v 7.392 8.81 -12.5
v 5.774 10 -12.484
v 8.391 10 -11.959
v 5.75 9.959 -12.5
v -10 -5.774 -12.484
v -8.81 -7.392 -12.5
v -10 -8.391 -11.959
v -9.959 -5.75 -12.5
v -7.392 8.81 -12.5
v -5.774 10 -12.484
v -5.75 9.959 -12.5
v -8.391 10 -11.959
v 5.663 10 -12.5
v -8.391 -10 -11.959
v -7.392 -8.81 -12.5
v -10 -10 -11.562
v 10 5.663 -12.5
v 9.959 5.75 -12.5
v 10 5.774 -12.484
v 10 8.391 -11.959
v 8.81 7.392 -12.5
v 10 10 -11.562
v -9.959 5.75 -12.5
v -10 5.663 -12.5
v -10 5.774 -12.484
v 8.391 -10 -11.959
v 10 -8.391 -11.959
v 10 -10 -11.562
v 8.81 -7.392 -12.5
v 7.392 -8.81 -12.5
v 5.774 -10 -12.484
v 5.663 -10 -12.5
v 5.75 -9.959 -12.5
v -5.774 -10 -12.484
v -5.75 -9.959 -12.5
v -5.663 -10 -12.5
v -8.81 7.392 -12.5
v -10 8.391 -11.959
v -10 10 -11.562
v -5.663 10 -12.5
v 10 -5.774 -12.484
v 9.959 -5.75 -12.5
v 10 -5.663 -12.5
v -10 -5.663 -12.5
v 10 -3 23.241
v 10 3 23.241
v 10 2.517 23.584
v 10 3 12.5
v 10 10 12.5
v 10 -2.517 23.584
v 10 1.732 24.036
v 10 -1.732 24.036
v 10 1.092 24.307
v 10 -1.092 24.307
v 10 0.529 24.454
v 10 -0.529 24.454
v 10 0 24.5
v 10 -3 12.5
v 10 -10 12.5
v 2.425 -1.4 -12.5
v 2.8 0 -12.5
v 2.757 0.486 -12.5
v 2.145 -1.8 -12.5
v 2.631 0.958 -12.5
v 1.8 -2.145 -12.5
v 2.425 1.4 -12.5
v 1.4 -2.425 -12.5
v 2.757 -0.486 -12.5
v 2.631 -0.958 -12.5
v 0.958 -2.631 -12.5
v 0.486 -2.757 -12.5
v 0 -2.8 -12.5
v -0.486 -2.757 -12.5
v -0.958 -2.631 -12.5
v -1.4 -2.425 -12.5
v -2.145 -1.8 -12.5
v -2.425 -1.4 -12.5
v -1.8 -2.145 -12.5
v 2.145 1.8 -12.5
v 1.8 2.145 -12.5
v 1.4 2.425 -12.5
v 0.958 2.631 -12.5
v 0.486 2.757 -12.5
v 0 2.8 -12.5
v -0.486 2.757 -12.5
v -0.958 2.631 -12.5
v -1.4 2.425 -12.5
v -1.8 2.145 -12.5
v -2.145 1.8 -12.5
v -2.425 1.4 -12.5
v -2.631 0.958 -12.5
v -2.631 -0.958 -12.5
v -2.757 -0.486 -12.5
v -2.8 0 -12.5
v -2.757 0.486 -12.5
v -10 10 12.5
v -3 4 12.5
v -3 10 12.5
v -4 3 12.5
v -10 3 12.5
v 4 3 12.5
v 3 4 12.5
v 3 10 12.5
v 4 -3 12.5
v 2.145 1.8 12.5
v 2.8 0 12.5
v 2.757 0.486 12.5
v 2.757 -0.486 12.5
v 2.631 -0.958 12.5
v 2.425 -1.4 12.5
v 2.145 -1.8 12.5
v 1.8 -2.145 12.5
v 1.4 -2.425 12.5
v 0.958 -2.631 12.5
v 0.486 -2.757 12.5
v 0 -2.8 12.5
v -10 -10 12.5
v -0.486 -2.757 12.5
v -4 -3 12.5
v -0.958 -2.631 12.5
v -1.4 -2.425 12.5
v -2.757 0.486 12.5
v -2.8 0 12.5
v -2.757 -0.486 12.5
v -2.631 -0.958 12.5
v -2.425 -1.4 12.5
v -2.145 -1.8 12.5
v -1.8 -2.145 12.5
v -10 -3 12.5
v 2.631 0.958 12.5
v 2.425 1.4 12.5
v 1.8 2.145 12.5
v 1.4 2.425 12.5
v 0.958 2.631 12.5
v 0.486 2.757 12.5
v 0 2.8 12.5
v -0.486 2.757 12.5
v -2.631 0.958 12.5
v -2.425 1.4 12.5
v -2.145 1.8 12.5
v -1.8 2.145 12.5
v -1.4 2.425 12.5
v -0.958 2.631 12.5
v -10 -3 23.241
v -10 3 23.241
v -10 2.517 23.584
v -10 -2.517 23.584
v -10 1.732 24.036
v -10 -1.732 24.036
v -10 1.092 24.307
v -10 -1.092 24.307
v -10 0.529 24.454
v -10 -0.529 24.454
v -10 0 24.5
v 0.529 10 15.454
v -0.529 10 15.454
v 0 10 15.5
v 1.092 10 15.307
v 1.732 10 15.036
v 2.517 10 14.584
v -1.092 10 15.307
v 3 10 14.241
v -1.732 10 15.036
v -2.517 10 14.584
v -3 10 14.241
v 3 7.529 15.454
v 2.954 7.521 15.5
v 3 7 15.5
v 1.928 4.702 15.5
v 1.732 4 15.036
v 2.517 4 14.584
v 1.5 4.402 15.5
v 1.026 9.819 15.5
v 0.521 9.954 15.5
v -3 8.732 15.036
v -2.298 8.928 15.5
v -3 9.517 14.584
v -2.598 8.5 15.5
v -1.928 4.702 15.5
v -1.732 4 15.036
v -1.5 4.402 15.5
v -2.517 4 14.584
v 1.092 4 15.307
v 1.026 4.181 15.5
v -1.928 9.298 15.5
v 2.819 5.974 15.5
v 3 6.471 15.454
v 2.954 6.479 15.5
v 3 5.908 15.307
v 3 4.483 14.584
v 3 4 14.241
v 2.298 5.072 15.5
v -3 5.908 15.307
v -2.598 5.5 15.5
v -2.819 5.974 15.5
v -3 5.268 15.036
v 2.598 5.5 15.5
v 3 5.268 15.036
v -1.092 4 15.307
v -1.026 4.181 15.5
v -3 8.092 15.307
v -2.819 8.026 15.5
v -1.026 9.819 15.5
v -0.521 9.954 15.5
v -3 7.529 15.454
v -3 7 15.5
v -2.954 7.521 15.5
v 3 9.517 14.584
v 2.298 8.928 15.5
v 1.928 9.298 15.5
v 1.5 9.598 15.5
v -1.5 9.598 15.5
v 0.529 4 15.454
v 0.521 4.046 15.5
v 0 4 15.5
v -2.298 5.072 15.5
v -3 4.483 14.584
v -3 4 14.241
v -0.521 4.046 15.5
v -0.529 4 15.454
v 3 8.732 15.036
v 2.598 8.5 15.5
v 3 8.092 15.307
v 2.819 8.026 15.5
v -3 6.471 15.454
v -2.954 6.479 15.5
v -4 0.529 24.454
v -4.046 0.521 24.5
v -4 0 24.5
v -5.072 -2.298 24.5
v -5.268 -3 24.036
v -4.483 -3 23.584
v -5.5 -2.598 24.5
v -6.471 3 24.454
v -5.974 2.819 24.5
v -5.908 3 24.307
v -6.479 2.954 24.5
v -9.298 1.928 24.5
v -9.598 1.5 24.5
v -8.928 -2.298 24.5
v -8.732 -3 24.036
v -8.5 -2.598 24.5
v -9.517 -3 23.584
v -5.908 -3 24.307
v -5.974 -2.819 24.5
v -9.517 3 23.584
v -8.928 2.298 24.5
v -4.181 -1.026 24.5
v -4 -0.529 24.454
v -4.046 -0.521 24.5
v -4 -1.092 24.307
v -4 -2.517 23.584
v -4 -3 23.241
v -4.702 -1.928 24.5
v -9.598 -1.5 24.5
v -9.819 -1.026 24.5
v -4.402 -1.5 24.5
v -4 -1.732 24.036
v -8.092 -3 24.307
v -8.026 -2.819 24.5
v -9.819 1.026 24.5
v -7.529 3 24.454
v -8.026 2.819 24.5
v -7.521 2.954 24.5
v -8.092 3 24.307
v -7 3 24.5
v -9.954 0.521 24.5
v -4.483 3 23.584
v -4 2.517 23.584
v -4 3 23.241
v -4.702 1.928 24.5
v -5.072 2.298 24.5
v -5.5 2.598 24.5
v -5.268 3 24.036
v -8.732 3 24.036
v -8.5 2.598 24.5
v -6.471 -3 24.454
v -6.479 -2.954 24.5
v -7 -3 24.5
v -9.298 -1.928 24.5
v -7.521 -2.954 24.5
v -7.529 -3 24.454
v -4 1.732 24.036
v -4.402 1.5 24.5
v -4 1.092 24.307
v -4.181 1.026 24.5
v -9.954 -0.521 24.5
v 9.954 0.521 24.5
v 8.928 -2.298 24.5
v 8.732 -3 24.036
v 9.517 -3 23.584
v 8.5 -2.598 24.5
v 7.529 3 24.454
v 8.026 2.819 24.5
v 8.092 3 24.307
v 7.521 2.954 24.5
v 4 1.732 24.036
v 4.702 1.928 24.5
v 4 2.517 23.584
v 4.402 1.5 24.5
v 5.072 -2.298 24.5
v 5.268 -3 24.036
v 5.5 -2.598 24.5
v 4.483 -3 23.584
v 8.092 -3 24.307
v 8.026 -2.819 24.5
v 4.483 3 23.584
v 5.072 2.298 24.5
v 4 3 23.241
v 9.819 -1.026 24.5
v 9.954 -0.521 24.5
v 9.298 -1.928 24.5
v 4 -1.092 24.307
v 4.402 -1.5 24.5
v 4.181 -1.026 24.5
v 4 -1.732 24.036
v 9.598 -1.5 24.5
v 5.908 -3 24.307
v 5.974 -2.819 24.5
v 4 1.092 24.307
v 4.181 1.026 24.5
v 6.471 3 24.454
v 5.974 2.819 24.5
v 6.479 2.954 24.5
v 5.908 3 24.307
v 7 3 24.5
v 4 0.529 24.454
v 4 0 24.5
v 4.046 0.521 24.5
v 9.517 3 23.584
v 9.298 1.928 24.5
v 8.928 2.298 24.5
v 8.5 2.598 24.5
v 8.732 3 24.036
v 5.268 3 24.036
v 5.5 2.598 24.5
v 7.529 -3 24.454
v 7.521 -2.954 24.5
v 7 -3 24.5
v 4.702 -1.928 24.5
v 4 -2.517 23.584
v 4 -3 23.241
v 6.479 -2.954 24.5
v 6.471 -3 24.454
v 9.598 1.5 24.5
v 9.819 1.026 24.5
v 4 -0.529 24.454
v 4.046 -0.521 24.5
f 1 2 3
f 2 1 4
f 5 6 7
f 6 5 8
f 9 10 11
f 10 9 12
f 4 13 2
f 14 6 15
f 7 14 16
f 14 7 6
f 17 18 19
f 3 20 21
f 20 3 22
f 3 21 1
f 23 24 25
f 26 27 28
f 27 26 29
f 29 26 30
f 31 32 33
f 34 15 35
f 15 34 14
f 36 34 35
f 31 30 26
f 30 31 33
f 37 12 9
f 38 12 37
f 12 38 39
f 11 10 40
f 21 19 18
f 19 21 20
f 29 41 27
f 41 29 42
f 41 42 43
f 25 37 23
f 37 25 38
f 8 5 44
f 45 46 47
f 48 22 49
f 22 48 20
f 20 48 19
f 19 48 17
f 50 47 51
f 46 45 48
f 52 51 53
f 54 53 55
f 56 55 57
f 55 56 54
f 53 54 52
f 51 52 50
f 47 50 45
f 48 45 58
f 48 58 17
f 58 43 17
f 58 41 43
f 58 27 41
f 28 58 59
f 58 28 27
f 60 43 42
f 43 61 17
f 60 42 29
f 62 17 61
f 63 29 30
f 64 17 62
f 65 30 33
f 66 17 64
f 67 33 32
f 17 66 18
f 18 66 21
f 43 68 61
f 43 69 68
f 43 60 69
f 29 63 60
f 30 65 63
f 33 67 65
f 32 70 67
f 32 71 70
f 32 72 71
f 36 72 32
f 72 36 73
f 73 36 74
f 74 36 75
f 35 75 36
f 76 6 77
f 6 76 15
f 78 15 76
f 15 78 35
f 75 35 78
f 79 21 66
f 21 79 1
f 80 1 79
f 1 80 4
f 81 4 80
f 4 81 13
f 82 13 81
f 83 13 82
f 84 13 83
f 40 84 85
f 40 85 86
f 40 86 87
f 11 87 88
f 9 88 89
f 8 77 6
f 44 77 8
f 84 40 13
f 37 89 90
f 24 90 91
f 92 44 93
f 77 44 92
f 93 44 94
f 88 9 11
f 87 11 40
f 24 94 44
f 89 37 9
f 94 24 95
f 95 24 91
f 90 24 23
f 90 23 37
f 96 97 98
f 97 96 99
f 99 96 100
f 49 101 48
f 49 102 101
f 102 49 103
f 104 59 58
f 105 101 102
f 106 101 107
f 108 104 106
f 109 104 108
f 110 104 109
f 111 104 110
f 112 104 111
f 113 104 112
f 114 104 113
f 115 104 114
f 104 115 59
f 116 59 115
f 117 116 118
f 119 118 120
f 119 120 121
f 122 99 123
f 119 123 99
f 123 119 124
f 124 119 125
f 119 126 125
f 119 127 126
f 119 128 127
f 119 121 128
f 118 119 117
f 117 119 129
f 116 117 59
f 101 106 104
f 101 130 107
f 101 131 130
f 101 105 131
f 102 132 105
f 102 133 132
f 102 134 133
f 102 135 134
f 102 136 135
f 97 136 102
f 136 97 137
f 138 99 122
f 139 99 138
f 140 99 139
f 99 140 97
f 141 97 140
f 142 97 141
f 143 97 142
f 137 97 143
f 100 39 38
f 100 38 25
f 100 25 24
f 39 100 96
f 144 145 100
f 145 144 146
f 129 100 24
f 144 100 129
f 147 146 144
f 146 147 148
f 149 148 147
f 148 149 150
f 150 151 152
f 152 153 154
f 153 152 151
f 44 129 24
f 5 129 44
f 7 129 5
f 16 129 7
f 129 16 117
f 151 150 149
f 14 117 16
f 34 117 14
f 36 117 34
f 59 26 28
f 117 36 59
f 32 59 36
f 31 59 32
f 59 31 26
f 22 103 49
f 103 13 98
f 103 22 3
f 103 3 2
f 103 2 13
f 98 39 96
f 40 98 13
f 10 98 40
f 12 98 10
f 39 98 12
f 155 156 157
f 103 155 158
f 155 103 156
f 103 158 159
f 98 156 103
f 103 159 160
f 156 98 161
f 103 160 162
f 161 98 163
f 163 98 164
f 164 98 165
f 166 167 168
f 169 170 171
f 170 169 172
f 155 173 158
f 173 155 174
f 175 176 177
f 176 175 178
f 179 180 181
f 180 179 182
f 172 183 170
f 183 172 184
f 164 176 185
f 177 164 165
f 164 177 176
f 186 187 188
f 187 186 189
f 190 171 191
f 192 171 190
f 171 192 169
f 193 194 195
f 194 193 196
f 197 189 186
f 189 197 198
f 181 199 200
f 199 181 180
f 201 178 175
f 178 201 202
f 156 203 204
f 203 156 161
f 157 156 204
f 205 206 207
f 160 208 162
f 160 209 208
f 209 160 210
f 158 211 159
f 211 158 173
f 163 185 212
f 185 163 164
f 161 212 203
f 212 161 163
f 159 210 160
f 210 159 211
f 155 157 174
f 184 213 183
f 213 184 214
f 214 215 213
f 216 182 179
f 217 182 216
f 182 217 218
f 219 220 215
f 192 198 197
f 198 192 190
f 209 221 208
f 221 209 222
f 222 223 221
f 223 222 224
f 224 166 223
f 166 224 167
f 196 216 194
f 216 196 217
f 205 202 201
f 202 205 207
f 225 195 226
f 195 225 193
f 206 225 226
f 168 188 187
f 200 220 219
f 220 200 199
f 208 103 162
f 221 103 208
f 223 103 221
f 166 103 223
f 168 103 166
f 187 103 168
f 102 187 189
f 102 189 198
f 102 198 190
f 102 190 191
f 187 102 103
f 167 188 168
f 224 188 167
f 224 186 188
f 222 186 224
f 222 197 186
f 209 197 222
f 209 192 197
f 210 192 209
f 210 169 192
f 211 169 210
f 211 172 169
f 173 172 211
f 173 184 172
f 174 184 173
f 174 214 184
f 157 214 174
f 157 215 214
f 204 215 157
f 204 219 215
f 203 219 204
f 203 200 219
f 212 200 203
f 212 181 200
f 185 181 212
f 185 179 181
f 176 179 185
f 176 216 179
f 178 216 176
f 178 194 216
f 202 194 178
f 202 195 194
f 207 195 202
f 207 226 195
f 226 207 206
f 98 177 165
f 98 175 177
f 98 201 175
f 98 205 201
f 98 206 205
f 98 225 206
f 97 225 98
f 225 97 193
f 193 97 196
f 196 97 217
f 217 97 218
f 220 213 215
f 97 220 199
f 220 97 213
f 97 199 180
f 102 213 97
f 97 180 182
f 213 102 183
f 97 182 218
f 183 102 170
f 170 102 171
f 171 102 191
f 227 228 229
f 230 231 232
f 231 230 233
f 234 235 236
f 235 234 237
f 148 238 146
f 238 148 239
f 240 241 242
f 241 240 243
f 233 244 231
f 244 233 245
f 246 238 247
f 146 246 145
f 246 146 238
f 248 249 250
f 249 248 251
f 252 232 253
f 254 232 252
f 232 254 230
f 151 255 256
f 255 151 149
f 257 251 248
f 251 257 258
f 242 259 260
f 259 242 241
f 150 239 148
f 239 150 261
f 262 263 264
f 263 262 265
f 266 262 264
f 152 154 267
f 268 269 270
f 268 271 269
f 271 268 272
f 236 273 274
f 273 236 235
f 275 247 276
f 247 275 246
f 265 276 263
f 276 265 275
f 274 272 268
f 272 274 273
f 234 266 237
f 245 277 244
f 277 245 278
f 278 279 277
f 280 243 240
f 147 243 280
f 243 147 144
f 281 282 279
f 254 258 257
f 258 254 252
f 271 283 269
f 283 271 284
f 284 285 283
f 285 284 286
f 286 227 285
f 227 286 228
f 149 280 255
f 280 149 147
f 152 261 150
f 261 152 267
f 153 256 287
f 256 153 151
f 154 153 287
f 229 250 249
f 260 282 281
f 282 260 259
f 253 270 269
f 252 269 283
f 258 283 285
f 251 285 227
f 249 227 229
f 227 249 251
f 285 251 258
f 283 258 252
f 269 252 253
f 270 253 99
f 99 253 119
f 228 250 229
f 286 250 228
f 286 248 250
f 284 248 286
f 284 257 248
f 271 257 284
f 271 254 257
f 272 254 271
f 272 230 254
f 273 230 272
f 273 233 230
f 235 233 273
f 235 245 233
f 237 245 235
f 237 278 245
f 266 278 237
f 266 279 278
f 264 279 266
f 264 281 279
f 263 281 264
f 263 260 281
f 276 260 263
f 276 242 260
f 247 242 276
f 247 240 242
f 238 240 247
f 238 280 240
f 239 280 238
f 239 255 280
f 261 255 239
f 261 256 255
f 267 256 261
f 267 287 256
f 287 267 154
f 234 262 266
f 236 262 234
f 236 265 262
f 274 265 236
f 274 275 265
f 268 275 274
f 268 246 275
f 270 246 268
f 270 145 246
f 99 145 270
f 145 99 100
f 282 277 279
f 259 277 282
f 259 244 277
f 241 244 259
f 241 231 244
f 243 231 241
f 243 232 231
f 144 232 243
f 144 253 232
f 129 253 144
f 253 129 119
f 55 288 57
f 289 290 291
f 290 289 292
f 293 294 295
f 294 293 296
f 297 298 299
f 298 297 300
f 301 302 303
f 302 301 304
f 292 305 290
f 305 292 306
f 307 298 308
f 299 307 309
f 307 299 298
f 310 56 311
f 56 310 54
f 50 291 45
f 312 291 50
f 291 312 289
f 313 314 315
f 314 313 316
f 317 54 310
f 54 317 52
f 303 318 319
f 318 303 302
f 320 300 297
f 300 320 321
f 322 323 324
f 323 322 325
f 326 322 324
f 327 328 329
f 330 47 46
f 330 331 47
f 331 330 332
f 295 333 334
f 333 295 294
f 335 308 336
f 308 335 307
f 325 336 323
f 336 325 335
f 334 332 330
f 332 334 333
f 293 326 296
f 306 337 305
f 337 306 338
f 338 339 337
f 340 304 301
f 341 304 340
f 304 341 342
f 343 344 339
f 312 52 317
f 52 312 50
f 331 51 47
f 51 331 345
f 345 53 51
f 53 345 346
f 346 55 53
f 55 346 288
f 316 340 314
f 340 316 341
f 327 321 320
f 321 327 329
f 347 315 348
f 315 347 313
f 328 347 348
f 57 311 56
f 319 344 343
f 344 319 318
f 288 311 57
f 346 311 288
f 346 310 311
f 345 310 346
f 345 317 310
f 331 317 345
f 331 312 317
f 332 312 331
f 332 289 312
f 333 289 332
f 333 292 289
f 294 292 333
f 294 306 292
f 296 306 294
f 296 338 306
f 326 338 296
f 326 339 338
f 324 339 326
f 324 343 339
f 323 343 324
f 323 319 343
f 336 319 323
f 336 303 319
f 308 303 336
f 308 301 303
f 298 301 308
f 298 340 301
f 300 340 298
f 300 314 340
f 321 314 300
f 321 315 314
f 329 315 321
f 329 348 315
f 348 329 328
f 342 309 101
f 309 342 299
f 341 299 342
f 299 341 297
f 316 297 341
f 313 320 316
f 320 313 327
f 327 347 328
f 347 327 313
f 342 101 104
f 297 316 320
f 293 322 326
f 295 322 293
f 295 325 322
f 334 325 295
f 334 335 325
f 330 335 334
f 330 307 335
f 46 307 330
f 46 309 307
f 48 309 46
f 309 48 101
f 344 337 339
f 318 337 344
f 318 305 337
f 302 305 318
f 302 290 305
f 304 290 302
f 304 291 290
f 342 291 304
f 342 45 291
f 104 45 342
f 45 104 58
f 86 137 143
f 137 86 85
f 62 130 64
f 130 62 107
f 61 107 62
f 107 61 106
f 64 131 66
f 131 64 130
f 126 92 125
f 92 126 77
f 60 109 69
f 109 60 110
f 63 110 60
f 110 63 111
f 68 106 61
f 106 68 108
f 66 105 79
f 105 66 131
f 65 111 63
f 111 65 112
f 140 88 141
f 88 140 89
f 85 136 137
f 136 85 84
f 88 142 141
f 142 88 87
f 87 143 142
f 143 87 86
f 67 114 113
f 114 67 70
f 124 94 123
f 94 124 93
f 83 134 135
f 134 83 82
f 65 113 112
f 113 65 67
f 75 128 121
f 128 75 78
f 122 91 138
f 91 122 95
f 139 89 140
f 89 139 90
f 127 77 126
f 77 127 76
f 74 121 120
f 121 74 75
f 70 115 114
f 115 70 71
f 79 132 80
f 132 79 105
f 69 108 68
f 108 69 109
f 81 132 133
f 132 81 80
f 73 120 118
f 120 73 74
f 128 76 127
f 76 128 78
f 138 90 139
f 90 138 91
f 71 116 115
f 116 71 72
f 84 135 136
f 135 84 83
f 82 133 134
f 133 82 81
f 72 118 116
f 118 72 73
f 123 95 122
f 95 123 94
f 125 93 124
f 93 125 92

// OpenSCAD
//
//  A simple guide block to help with tapping the center
//  hole on a 20mm aluminum extrusion beam.
//
//  Supports asymmetric guide pins because I thought I was
//  going to need that. In the end, it turned out that my 3D printer
//  support rod kit had already been redesigned in such a way
//  that tapping was not required, so I ended up not actually
//  needing this little widget. Oh well.
//
//  Copyright (c) 2020 Sarah Kelley, sarah@sakelley.org
//

//  Permission is hereby granted, free of charge, to any person obtaining a copy
//  of this software and associated documentation files (the "Software"), to deal
//  in the Software without restriction, including without limitation the rights
//  to use, copy, modify, merge, publish, distribute, sublicense, and/or sell
//  copies of the Software, and to permit persons to whom the Software is
//  furnished to do so, subject to the following conditions:
//  
//  The above copyright notice and this permission notice shall be included in all
//  copies or substantial portions of the Software.
//  
//  THE SOFTWARE IS PROVIDED "AS IS", WITHOUT WARRANTY OF ANY KIND, EXPRESS OR
//  IMPLIED, INCLUDING BUT NOT LIMITED TO THE WARRANTIES OF MERCHANTABILITY,
//  FITNESS FOR A PARTICULAR PURPOSE AND NONINFRINGEMENT. IN NO EVENT SHALL THE
//  AUTHORS OR COPYRIGHT HOLDERS BE LIABLE FOR ANY CLAIM, DAMAGES OR OTHER
//  LIABILITY, WHETHER IN AN ACTION OF CONTRACT, TORT OR OTHERWISE, ARISING FROM,
//  OUT OF OR IN CONNECTION WITH THE SOFTWARE OR THE USE OR OTHER DEALINGS IN THE
//  SOFTWARE.
//



module guideBlock2020(
    h = 5,
    guideHoleDiameter=5.6,
    guideCubeSize=6,
    longGuideLength=12,
    shortGuideLength=3,
    oneShortPin=false,
    extrusionSize=20
) {
    // a cube with one end tapered off a little bit
    module tapered_cube(size, length, taperLength=6, taperConeScale=2) {
        intersection() {
            cube([size, size, length], center=true);
            union() {
                translate([0,0,length/2]) 
                    cylinder(h=taperLength, d1=taperConeScale*size, d2=0, center=true, $fn=36);
                translate([0,0,-taperLength/2]) 
                    cylinder(h=length, d=2*size, center=true, $fn=36);
            
            }
        }
    }
    difference() {
        union() {
            // Main block
            rotate([180,0,0])
                // tiny taper on the outside face
                // (mostly just makes easier to unstick from the pront bed)
                tapered_cube(extrusionSize, h, taperLength=8, taperConeScale=2.3);
            
            // short pins for the extrusion channels
            shortPins = oneShortPin ? [1] : [-1,1];
            for (i = shortPins) {
                td = i*((extrusionSize/2)-(guideCubeSize/2));
                th = (h/2) + (shortGuideLength/2);
                translate([ 0, td, th]) 
                    tapered_cube(guideCubeSize,shortGuideLength);
            }
            
            // long pins for the extrusion channels
            for (i = [-1, 1]) {
                tw = i*((extrusionSize/2)-(guideCubeSize/2));
                th = (h/2) + (longGuideLength/2);
                translate([ tw, 0, th]) 
                    tapered_cube(guideCubeSize,longGuideLength);
            }
        }
        
        // hole for the tap
        cylinder(h=h+0.01, d=guideHoleDiameter,center=true, $fn=36);
    }
}

guideBlock2020(h=25, oneShortPin=true);
